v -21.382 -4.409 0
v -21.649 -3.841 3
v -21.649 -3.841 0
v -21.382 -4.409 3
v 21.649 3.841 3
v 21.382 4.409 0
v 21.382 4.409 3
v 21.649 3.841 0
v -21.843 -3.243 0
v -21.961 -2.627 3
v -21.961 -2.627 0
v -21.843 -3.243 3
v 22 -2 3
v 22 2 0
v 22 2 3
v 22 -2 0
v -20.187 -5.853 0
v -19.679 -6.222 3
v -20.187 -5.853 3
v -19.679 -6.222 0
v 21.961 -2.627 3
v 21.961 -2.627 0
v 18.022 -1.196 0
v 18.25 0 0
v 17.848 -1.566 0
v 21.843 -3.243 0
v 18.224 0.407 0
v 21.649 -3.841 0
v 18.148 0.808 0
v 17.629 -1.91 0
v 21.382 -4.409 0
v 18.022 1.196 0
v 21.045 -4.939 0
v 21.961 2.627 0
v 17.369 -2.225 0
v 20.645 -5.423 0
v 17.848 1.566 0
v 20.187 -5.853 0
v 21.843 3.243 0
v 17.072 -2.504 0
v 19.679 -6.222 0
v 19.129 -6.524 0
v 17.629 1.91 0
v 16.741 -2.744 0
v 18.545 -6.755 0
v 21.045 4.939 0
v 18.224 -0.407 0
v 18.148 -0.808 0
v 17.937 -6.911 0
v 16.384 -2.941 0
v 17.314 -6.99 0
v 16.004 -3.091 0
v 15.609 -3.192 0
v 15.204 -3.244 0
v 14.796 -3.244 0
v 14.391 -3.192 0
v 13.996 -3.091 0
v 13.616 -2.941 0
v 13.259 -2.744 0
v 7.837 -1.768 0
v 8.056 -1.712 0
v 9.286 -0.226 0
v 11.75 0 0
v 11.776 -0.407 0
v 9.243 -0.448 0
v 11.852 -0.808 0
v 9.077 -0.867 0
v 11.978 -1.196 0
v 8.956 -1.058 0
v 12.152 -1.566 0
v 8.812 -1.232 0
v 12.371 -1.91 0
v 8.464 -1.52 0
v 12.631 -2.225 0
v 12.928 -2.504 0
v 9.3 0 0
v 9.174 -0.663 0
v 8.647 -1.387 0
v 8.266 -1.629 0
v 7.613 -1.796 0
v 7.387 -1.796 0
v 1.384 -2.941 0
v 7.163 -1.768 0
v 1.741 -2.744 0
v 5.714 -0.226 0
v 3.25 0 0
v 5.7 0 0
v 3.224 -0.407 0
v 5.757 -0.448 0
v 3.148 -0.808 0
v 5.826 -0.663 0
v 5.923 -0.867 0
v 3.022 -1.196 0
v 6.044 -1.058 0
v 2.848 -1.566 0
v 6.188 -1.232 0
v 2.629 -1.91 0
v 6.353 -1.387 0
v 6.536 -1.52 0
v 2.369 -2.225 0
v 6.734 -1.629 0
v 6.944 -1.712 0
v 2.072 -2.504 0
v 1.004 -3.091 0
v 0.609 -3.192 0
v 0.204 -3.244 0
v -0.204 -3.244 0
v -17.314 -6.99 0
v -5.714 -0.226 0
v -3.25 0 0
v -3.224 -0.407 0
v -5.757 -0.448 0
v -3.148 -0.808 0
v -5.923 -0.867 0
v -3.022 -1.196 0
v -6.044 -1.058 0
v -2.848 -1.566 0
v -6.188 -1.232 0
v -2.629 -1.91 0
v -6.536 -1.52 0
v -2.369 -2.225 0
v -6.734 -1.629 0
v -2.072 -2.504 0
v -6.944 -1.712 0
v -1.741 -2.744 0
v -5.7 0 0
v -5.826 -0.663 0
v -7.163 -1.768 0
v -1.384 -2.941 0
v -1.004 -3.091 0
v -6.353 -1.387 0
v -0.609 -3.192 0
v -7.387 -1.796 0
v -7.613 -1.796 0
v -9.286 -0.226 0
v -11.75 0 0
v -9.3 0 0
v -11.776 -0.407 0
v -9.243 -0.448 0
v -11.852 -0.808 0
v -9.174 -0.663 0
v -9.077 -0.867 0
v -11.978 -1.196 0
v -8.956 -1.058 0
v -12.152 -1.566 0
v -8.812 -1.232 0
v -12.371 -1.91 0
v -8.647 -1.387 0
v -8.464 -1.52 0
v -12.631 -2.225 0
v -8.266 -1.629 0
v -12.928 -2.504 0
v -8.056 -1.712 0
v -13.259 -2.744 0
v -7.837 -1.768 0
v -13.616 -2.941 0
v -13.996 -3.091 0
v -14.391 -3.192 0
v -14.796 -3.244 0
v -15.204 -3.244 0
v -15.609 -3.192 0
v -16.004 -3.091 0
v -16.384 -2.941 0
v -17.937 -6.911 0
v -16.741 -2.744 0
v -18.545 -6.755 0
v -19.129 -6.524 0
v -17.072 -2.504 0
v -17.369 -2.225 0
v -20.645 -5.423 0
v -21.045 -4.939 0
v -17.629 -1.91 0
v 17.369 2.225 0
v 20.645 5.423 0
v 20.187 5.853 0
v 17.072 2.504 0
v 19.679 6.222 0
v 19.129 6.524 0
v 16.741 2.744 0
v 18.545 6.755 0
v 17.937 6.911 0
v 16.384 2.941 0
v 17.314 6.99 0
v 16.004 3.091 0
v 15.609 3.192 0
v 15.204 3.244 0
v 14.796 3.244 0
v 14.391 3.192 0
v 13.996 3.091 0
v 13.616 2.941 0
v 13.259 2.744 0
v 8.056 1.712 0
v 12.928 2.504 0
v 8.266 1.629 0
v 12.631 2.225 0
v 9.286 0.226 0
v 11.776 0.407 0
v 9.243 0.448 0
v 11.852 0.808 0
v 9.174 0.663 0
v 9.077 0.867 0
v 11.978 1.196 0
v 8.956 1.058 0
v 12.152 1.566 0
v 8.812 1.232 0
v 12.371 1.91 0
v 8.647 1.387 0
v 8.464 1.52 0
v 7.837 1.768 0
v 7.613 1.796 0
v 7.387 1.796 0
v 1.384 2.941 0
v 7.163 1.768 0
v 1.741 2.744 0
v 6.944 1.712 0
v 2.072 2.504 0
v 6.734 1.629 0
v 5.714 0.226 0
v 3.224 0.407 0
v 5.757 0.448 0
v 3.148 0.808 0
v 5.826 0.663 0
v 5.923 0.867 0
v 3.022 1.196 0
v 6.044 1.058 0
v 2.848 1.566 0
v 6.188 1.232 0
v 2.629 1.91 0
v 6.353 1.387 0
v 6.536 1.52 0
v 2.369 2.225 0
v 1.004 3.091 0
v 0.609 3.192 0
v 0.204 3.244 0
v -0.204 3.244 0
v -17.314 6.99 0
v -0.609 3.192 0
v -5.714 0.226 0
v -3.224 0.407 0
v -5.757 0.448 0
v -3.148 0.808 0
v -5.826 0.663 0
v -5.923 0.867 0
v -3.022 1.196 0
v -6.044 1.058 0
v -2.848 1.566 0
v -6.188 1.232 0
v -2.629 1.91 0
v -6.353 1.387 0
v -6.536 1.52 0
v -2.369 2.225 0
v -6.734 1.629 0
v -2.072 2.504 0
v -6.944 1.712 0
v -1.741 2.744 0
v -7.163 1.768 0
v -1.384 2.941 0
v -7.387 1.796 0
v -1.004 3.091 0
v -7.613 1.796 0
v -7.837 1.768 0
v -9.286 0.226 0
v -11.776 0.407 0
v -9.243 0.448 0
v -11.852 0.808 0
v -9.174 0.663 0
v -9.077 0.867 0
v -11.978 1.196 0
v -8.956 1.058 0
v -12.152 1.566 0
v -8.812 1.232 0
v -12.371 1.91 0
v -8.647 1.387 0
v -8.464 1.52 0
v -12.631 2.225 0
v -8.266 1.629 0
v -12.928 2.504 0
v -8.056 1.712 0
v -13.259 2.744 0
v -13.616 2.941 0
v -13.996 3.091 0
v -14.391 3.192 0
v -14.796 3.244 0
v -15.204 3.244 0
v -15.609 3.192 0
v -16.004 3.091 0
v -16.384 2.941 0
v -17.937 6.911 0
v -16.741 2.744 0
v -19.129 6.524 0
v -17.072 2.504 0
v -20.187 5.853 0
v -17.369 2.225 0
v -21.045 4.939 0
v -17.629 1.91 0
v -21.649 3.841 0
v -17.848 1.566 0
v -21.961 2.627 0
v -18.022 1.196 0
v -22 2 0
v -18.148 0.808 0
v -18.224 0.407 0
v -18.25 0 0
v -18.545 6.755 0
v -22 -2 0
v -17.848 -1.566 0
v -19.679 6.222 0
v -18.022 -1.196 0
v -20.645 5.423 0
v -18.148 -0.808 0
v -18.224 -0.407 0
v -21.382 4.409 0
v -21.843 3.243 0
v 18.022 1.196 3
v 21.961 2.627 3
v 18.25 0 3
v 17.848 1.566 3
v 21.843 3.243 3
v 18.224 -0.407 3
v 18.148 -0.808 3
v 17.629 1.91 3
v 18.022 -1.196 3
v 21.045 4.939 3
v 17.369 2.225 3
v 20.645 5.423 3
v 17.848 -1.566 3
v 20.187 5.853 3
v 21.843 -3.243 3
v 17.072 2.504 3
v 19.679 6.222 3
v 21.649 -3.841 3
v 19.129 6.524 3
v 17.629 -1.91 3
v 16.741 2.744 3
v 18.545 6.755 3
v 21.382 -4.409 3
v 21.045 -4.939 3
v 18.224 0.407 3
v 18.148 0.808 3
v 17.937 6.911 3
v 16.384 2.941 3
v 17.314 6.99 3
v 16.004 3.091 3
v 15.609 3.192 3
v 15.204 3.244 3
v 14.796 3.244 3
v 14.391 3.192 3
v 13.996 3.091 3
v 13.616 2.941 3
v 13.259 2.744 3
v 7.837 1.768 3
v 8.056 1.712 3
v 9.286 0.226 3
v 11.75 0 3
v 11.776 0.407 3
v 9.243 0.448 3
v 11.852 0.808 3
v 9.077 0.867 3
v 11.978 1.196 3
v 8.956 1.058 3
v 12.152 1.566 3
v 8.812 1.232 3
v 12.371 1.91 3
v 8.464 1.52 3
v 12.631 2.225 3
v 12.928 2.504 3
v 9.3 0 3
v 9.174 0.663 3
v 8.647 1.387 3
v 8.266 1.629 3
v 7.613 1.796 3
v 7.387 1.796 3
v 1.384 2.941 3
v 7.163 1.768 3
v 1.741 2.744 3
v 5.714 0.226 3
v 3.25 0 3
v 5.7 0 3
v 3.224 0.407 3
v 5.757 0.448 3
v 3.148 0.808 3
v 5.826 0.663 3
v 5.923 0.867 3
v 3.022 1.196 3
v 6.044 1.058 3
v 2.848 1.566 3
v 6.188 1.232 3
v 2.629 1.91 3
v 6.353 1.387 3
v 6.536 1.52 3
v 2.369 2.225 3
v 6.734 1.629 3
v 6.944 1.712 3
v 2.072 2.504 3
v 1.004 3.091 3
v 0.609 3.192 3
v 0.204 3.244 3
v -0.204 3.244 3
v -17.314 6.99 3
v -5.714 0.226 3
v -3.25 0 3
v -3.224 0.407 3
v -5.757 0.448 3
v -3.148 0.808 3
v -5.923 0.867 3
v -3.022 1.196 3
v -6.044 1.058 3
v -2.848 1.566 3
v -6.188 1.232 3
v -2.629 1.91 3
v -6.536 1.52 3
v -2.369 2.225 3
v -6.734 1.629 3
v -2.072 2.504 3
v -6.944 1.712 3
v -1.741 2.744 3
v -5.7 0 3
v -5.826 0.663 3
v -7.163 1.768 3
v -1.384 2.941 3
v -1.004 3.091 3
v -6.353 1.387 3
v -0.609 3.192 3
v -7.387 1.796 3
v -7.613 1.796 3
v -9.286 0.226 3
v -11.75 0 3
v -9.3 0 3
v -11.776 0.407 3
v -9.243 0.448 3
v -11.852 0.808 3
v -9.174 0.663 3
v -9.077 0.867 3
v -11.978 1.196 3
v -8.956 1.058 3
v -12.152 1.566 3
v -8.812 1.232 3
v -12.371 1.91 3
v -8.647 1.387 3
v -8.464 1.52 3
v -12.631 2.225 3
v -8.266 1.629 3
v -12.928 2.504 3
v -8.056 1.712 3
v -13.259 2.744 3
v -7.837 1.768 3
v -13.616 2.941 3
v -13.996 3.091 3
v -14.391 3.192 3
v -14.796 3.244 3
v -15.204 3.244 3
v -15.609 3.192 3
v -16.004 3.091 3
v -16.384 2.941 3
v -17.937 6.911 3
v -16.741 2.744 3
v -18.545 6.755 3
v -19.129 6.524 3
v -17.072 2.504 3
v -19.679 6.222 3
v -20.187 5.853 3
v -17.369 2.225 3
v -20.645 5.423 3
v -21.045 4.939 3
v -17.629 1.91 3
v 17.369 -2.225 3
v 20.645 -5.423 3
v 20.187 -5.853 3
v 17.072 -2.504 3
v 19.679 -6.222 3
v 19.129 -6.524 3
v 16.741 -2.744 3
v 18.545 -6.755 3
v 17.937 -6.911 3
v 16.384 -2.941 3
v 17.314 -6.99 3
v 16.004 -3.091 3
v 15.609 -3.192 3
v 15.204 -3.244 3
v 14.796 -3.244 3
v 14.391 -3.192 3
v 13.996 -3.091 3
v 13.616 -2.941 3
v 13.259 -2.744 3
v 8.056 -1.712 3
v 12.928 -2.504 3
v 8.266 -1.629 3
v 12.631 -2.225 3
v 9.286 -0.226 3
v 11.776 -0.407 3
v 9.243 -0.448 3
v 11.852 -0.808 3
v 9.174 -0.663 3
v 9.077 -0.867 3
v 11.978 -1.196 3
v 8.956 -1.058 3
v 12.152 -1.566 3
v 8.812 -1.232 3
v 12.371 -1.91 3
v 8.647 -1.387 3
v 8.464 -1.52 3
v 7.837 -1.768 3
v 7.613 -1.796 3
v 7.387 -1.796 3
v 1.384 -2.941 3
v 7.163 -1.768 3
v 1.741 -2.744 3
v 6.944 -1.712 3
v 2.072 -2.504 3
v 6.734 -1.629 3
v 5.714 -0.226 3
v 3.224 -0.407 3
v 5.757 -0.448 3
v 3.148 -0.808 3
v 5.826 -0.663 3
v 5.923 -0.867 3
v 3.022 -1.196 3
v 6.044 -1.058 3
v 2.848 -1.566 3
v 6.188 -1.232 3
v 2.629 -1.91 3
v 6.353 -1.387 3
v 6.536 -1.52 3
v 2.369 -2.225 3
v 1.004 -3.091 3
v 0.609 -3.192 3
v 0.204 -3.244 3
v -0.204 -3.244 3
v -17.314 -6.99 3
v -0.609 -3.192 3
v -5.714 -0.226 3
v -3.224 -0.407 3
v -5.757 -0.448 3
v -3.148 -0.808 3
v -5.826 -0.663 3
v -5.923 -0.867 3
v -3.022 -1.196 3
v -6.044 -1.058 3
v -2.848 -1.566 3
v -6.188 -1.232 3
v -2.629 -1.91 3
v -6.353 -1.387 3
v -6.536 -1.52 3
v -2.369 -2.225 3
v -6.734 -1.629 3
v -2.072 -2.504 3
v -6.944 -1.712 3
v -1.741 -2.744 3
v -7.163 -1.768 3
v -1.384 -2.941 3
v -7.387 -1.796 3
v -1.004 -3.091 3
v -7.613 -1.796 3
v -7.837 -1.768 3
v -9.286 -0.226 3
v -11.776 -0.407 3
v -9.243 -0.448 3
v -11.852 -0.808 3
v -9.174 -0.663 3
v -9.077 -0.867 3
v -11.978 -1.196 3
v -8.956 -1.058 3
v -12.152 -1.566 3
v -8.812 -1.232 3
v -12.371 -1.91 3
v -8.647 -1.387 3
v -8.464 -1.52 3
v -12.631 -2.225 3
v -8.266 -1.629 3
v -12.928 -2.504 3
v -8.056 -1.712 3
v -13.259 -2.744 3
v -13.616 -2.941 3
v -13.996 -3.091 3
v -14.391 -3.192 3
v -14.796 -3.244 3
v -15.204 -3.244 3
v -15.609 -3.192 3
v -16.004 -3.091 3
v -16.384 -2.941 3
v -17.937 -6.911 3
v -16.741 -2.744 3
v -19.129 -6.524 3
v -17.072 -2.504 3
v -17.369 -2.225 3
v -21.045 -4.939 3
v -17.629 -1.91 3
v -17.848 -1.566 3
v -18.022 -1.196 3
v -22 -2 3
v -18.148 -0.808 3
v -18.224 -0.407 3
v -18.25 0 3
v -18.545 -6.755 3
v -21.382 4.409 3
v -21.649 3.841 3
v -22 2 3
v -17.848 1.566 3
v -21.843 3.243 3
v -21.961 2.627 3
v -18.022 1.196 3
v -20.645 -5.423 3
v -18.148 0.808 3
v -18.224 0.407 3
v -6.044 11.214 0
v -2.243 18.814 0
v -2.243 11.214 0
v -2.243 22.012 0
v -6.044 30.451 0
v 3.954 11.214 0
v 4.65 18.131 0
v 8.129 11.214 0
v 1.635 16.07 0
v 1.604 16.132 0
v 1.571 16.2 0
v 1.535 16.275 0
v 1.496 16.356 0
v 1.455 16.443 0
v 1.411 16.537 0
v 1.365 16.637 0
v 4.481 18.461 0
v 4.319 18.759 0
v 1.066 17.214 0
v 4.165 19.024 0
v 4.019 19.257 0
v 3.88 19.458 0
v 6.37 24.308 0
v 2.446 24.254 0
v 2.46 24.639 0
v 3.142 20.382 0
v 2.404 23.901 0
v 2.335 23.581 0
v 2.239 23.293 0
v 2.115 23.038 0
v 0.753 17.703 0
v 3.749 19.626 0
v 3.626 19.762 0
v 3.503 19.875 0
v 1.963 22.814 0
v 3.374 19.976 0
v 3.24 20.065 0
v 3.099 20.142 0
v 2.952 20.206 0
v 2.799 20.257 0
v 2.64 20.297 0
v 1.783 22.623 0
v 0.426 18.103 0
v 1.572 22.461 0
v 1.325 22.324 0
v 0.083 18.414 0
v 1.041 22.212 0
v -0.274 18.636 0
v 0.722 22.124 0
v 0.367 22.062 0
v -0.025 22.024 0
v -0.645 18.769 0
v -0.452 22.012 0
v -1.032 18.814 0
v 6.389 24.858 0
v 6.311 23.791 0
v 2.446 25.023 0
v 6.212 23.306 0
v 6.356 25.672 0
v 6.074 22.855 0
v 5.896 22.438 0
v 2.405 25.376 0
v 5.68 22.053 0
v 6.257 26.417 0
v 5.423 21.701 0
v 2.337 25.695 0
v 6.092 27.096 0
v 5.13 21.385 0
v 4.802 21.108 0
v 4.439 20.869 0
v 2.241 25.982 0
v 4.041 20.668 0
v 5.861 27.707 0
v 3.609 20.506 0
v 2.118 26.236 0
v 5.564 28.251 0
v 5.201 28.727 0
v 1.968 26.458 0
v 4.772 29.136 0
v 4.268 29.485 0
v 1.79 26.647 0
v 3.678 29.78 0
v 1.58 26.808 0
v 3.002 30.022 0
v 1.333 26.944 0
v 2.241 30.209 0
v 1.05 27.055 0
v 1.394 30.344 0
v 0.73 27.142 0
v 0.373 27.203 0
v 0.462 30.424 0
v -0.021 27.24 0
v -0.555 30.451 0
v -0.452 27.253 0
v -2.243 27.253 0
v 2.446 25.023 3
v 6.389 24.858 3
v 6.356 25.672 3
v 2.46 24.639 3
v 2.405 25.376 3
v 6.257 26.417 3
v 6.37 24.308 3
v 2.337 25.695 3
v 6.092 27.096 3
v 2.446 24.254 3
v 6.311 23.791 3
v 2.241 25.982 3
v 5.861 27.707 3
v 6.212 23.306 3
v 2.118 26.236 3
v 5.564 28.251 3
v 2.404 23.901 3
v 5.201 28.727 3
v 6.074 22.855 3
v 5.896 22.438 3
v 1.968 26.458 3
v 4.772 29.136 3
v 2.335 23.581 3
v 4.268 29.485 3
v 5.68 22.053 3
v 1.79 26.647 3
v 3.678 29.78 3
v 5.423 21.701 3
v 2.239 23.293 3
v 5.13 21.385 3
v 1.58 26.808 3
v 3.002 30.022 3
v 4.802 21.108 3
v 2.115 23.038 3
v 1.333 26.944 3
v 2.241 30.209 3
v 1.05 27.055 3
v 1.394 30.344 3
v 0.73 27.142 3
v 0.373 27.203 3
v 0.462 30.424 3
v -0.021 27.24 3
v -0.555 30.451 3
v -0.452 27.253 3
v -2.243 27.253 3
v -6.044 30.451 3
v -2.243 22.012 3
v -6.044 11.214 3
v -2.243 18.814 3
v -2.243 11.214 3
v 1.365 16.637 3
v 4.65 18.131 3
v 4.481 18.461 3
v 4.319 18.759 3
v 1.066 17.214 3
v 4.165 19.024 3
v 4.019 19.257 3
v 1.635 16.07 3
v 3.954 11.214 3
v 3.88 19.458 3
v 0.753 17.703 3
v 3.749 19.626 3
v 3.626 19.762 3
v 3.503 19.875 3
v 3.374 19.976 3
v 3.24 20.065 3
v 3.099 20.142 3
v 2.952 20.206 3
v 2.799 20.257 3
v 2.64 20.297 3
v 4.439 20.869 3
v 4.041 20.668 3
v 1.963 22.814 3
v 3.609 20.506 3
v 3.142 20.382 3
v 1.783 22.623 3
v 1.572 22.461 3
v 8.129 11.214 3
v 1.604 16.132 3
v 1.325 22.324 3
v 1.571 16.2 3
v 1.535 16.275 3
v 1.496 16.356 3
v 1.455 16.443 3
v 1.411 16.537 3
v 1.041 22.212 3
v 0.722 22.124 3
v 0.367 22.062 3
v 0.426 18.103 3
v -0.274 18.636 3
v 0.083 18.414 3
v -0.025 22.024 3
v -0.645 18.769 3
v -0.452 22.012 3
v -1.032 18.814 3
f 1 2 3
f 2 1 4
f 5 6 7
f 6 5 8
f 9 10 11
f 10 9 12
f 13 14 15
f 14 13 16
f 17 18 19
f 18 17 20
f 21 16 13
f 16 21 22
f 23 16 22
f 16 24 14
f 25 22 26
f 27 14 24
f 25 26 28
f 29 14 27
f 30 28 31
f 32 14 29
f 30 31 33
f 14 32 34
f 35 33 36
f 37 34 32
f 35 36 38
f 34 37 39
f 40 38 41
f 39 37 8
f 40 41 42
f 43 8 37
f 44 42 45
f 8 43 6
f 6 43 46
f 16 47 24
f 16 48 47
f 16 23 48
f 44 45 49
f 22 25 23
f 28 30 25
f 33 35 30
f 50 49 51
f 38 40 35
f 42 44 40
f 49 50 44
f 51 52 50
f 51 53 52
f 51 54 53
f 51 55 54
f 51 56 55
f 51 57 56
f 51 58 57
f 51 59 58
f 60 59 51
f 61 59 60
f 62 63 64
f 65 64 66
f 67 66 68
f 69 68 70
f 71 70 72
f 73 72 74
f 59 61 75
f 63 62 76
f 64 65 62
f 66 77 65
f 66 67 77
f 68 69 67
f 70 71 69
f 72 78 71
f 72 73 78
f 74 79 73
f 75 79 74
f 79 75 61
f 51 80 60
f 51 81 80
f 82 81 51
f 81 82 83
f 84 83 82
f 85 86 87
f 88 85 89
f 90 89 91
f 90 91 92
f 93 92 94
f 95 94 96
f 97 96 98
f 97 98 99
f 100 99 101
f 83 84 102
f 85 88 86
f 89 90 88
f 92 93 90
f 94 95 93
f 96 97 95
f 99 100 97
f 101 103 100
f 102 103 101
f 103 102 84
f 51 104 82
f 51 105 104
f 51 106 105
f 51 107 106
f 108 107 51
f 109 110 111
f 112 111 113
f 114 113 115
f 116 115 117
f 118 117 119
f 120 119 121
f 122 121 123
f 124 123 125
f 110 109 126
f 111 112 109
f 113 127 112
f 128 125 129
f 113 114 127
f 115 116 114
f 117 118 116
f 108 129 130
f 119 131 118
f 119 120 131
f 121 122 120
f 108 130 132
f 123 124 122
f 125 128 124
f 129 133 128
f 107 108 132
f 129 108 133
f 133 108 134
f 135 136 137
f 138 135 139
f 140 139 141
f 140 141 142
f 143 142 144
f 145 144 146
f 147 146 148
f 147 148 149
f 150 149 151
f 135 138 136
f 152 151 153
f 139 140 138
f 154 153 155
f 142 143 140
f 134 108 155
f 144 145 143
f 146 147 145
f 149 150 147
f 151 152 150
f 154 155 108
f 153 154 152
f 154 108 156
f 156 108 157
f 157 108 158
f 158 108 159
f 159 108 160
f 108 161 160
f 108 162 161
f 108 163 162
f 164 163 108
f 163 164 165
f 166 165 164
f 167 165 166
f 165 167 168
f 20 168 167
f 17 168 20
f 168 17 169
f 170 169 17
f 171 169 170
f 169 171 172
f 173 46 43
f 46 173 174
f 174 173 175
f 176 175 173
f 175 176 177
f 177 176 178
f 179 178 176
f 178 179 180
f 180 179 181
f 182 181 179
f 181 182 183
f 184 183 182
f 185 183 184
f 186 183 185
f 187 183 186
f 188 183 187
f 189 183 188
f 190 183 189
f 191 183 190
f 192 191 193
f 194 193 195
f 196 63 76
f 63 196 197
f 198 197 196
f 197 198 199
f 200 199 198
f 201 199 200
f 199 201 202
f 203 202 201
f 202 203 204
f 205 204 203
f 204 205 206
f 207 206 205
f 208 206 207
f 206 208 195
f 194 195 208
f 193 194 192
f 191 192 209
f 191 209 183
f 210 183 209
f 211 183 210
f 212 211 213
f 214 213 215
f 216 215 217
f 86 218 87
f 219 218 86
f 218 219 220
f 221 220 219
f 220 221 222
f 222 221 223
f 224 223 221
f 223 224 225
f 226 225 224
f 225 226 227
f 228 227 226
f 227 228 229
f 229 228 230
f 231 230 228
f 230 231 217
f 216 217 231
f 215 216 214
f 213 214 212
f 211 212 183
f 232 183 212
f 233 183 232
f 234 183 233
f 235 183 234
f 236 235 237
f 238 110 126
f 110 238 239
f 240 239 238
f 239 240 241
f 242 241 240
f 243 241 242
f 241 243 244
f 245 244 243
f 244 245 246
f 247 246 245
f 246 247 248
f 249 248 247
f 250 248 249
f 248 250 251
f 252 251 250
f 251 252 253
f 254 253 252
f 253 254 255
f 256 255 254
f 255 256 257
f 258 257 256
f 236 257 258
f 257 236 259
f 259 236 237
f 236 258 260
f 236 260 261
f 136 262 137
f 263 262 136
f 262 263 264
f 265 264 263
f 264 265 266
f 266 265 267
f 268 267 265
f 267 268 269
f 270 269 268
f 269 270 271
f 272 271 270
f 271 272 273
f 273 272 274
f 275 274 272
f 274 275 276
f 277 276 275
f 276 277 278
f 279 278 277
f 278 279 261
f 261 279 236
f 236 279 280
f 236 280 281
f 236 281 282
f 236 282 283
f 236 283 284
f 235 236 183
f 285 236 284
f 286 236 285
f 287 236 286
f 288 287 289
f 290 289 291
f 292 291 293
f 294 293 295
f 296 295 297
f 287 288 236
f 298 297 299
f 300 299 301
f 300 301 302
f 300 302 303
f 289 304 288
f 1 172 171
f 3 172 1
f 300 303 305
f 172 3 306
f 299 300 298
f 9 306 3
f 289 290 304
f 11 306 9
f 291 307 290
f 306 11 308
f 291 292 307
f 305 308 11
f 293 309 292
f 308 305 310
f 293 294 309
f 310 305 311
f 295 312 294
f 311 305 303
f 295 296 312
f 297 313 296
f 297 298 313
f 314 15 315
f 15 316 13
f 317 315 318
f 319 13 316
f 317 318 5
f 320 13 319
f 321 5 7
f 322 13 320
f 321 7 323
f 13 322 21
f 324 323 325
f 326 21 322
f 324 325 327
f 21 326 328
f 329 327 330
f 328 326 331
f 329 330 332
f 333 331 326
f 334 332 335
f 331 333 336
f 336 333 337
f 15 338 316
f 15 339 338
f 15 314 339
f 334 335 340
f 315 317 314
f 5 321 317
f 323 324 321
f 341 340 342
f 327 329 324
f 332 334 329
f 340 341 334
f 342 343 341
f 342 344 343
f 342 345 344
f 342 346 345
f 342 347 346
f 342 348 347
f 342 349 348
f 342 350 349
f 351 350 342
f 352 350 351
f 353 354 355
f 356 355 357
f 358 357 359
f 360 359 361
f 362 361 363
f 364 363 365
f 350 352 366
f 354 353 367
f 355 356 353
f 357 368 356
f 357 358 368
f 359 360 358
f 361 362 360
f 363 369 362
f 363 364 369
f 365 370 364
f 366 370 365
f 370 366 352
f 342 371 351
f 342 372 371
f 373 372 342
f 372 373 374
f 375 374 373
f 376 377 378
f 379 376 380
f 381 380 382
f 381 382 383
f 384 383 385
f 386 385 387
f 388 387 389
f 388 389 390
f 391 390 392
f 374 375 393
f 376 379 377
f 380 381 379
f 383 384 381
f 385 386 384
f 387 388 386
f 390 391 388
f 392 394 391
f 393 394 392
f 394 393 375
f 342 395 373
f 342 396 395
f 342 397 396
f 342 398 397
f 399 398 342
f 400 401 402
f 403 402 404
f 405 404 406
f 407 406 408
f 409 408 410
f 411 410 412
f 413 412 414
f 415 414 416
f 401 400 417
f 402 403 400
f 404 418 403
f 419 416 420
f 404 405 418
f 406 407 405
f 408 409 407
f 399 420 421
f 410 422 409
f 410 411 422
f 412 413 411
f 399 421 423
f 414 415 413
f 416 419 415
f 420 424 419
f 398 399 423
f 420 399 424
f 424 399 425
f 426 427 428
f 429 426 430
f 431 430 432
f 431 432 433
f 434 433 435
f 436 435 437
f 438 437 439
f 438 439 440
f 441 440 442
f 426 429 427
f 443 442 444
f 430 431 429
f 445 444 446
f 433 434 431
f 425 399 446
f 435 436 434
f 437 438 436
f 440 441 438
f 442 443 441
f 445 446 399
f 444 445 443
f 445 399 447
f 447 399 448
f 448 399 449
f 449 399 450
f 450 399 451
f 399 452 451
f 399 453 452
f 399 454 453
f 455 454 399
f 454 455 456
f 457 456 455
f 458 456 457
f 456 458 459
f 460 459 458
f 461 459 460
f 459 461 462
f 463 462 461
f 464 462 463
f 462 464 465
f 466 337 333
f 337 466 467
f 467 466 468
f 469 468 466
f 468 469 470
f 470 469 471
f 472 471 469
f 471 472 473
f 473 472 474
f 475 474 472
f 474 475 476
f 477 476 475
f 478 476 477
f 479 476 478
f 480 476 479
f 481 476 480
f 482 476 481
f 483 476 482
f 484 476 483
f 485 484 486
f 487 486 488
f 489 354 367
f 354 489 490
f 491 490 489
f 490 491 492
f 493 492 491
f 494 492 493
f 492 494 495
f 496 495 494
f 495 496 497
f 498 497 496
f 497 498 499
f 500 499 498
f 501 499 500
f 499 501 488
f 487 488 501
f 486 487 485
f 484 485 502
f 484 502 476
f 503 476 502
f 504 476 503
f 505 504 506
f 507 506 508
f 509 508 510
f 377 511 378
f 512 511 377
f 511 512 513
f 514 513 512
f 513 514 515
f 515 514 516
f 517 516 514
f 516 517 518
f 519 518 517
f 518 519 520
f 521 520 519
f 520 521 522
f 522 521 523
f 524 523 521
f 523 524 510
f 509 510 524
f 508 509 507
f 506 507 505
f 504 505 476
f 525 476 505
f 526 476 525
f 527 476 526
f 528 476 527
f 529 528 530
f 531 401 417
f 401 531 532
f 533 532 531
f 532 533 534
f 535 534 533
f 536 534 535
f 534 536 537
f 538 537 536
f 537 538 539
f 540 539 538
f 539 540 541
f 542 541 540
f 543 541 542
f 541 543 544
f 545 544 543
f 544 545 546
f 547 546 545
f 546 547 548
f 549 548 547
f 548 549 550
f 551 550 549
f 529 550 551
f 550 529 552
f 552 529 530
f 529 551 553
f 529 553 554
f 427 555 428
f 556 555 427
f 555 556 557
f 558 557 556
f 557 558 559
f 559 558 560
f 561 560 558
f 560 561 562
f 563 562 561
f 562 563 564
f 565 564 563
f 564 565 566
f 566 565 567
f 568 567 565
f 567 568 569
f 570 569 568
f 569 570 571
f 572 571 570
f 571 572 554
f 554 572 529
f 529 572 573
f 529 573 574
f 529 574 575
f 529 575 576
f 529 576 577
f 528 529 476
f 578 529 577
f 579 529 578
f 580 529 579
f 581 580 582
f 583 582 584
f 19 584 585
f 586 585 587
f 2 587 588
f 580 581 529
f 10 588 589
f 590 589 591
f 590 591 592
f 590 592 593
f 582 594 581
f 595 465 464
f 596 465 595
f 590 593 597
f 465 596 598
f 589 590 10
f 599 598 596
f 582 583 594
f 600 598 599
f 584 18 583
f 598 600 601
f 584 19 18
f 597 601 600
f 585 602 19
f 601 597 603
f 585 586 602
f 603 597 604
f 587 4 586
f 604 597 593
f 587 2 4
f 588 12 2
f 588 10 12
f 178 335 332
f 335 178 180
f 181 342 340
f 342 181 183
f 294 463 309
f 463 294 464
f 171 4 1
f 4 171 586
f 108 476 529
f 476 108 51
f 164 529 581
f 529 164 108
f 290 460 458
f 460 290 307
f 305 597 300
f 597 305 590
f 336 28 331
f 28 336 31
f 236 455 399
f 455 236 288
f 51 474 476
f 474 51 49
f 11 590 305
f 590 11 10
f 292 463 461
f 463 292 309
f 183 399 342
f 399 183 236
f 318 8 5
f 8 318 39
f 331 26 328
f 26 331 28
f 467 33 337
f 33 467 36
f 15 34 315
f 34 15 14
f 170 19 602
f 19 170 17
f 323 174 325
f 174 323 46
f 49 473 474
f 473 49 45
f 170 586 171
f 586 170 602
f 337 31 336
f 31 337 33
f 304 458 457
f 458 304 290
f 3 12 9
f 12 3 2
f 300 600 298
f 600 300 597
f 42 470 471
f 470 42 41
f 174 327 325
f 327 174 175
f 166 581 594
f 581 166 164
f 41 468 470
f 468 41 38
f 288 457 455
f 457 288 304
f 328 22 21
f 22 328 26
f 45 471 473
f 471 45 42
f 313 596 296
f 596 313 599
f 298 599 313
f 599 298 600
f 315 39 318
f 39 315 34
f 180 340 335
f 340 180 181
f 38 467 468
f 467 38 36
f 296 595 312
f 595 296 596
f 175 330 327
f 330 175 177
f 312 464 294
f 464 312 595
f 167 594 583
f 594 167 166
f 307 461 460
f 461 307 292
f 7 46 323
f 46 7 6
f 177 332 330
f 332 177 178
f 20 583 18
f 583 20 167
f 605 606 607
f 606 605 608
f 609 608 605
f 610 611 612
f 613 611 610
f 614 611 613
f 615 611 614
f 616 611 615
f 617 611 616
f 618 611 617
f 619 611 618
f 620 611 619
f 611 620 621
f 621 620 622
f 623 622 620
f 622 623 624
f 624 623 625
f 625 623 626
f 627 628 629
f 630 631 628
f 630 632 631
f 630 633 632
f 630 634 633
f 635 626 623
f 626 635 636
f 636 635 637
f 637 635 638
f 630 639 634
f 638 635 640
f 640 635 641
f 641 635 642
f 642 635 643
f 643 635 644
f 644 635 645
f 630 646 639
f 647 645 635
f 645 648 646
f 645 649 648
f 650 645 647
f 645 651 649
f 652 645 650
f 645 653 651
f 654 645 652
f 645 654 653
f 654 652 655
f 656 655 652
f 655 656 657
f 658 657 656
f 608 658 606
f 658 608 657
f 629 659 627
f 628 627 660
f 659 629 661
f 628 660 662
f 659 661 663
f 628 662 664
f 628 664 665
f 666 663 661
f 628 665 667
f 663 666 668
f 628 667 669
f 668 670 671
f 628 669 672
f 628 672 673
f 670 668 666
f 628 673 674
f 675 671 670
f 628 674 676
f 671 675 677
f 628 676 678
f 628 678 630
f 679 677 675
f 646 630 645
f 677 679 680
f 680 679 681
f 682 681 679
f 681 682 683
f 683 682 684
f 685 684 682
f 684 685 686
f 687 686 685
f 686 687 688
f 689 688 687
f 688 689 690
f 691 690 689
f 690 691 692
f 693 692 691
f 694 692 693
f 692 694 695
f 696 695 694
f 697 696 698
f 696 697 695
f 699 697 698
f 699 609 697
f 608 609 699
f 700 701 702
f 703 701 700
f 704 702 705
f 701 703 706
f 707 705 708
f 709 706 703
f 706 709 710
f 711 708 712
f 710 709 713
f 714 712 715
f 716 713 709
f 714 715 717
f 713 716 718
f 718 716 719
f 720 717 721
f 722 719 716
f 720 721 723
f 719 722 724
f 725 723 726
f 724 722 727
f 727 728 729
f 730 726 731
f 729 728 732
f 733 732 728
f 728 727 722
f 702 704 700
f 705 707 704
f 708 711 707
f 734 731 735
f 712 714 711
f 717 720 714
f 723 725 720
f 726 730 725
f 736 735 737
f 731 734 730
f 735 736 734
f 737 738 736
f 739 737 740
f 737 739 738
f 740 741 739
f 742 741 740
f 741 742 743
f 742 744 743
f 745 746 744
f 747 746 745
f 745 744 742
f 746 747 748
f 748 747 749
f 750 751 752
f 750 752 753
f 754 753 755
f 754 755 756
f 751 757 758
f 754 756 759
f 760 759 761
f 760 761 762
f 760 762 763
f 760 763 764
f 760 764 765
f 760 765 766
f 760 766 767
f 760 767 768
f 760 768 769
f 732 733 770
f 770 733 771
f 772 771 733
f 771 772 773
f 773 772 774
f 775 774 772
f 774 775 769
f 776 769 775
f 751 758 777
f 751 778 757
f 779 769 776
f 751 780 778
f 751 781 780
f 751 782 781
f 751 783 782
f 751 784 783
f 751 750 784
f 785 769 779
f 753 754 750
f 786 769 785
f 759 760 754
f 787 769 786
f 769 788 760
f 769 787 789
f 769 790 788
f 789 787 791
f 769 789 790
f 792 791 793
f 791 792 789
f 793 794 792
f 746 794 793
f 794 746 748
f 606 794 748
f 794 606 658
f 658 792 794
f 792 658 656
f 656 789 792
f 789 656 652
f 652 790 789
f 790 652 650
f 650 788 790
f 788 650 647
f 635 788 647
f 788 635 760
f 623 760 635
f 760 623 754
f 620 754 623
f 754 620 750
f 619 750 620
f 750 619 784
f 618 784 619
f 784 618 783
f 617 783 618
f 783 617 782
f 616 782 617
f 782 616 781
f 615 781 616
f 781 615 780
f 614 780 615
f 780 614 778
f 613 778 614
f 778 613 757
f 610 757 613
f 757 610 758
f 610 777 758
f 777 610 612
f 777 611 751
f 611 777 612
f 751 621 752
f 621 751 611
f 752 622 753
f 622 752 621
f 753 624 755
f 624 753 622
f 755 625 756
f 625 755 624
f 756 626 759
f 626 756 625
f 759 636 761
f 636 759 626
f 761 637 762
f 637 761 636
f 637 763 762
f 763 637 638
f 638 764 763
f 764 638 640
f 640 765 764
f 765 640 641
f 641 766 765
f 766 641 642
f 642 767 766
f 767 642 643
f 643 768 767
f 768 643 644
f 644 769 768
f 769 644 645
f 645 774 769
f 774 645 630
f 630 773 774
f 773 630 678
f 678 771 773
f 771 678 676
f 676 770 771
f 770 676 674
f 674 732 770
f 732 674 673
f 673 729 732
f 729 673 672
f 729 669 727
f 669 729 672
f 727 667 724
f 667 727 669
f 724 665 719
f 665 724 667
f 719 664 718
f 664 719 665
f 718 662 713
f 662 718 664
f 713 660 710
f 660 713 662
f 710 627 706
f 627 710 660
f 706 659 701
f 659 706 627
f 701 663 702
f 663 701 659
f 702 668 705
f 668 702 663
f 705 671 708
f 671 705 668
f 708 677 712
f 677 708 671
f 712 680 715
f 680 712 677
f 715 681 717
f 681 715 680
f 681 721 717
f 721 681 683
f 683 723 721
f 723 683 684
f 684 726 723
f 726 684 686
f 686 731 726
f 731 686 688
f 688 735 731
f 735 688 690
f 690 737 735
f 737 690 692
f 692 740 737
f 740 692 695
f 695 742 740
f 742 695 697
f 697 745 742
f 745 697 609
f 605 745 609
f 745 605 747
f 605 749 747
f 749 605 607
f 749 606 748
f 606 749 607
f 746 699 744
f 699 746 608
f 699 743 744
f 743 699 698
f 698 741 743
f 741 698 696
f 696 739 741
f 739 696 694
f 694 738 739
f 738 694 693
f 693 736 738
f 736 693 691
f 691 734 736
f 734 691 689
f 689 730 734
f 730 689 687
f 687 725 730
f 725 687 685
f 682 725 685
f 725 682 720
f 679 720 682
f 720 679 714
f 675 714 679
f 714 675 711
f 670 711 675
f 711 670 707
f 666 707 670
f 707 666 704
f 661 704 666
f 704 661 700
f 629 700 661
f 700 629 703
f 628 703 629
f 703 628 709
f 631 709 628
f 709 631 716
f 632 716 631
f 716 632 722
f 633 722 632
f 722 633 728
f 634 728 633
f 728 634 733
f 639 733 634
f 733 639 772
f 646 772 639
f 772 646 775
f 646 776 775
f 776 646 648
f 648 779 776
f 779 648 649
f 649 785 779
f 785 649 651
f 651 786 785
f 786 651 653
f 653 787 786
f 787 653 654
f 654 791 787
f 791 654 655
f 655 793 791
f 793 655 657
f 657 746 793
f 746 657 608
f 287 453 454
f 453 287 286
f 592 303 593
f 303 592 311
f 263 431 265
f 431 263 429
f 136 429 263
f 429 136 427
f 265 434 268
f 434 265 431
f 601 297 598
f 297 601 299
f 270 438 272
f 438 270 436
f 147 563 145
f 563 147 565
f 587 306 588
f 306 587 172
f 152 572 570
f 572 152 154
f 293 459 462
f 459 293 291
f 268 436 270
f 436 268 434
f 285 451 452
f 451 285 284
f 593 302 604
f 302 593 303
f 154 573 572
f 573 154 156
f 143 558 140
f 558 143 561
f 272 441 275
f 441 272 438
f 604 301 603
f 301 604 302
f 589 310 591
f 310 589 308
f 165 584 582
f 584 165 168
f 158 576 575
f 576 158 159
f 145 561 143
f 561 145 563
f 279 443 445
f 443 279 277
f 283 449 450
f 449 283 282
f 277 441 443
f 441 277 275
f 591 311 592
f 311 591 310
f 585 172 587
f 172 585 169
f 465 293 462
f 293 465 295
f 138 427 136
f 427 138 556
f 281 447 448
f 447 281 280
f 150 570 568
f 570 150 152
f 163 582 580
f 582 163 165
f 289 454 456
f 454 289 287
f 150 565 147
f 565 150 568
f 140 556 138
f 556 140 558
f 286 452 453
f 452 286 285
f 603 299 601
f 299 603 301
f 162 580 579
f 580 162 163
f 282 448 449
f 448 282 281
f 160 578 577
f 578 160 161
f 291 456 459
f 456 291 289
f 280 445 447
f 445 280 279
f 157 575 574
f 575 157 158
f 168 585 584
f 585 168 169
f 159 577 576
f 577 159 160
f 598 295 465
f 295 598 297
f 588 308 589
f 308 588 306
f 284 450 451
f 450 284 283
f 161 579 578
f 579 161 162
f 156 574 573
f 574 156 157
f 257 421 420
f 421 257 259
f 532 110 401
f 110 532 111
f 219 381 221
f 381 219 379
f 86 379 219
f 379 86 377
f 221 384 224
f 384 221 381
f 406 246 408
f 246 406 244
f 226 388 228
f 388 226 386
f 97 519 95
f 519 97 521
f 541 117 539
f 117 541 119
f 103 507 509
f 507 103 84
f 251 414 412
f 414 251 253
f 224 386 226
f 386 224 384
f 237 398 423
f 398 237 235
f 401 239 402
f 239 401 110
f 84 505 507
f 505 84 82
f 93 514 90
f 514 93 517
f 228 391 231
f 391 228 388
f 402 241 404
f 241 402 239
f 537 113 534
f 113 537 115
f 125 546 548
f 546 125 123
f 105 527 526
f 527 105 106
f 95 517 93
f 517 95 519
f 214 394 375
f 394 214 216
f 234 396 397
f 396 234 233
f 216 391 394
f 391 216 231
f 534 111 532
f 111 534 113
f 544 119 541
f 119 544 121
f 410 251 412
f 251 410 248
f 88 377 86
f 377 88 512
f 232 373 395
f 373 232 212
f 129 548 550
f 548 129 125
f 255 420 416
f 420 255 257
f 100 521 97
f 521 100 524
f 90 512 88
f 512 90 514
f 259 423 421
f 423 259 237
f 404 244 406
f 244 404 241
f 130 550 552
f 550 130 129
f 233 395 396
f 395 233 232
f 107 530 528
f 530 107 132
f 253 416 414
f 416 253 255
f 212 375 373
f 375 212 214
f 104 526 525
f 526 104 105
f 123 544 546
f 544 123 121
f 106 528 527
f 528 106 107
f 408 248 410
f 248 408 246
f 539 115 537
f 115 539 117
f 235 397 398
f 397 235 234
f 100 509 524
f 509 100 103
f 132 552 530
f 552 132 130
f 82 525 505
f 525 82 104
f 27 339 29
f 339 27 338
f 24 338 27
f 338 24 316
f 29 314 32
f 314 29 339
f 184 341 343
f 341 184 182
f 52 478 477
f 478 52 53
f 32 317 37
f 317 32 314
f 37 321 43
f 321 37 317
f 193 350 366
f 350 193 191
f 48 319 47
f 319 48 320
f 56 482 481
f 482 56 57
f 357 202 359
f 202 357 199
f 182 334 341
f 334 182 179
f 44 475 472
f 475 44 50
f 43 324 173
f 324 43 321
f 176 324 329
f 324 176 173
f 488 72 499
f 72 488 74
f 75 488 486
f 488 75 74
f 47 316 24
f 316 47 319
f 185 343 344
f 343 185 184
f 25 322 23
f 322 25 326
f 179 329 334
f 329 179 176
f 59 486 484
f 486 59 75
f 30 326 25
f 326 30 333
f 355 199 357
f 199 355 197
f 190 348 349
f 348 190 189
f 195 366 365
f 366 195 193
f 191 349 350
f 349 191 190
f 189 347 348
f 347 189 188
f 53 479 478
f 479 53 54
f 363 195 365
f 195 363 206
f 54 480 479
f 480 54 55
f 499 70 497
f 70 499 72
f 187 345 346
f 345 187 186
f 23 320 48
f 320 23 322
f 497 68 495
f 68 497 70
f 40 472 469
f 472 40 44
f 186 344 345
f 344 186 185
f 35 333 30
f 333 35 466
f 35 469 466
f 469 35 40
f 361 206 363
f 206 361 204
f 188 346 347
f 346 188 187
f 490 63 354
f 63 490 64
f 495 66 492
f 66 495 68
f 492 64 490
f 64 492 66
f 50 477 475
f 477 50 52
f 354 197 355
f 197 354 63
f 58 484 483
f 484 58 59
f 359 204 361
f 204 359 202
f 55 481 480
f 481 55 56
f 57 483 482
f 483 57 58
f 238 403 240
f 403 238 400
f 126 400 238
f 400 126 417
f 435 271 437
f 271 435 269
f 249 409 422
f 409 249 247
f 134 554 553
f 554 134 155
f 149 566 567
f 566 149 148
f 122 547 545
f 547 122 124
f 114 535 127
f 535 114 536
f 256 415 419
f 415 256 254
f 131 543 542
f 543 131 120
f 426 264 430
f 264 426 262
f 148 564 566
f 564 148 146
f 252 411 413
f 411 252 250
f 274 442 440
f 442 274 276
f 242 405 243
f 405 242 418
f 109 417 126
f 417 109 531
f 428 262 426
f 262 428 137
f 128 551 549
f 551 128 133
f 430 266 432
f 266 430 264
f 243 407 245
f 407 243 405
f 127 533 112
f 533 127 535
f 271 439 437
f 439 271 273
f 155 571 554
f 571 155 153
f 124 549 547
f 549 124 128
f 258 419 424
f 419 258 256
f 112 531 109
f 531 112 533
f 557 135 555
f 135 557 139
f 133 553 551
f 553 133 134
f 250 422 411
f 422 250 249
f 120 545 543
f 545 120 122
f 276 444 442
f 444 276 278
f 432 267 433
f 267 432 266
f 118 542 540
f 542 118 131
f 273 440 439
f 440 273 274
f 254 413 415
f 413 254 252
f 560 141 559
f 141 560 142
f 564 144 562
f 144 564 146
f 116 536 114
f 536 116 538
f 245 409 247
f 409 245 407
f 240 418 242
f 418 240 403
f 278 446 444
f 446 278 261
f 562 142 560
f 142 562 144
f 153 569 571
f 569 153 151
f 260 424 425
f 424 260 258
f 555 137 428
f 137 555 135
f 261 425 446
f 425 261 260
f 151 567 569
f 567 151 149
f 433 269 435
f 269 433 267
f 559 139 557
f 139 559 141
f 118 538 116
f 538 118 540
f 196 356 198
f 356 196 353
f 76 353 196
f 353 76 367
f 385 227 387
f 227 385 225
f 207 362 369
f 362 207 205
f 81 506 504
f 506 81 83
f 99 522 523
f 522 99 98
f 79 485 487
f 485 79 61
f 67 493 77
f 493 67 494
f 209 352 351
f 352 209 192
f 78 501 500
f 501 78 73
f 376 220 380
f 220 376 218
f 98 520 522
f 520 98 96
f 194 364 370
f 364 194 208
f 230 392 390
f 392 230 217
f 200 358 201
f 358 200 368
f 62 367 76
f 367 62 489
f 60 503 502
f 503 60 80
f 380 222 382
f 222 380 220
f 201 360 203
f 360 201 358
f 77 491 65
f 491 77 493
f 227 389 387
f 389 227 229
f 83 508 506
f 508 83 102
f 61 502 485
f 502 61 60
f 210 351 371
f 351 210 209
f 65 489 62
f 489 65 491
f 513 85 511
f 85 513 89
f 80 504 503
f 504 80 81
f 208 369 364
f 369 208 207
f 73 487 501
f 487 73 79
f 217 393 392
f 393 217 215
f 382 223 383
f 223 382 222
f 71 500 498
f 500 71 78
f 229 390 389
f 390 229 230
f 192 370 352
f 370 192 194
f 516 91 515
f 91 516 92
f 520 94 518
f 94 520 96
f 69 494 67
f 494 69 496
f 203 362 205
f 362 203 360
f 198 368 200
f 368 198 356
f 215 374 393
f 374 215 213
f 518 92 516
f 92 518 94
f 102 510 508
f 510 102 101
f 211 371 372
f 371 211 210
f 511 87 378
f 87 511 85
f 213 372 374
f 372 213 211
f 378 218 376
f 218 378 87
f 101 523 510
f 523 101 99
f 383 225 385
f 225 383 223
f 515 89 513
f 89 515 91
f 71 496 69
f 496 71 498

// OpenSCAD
$fn = 50;


difference() {
	union() {
		hull() {
			translate(v = [-17.0000000000, 2.0000000000, 0]) {
				cylinder(h = 3, r = 5);
			}
			translate(v = [17.0000000000, 2.0000000000, 0]) {
				cylinder(h = 3, r = 5);
			}
			translate(v = [-17.0000000000, -2.0000000000, 0]) {
				cylinder(h = 3, r = 5);
			}
			translate(v = [17.0000000000, -2.0000000000, 0]) {
				cylinder(h = 3, r = 5);
			}
		}
		translate(v = [0, 30.0000000000, 0]) {
			linear_extrude(height = 3) {
				text(font = "DejaVu Sans Mono:style=Bold", halign = "center", size = 19.0000000000, text = "R", valign = "top");
			}
		}
	}
	union() {
		translate(v = [-15.0000000000, 0.0000000000, 0]) {
			translate(v = [0, 0, -100]) {
				cylinder(h = 200, r = 3.2500000000);
			}
		}
		translate(v = [0, 0, -100]) {
			cylinder(h = 200, r = 3.2500000000);
		}
		translate(v = [15.0000000000, 0.0000000000, 0]) {
			translate(v = [0, 0, -100]) {
				cylinder(h = 200, r = 3.2500000000);
			}
		}
		translate(v = [-15.0000000000, 0.0000000000, 0]) {
			translate(v = [0, 0, -100]) {
				cylinder(h = 200, r = 1.8000000000);
			}
		}
		translate(v = [-7.5000000000, 0.0000000000, 0]) {
			translate(v = [0, 0, -100]) {
				cylinder(h = 200, r = 1.8000000000);
			}
		}
		translate(v = [0, 0, -100]) {
			cylinder(h = 200, r = 1.8000000000);
		}
		translate(v = [7.5000000000, 0.0000000000, 0]) {
			translate(v = [0, 0, -100]) {
				cylinder(h = 200, r = 1.8000000000);
			}
		}
		translate(v = [15.0000000000, 0.0000000000, 0]) {
			translate(v = [0, 0, -100]) {
				cylinder(h = 200, r = 1.8000000000);
			}
		}
	}
}
